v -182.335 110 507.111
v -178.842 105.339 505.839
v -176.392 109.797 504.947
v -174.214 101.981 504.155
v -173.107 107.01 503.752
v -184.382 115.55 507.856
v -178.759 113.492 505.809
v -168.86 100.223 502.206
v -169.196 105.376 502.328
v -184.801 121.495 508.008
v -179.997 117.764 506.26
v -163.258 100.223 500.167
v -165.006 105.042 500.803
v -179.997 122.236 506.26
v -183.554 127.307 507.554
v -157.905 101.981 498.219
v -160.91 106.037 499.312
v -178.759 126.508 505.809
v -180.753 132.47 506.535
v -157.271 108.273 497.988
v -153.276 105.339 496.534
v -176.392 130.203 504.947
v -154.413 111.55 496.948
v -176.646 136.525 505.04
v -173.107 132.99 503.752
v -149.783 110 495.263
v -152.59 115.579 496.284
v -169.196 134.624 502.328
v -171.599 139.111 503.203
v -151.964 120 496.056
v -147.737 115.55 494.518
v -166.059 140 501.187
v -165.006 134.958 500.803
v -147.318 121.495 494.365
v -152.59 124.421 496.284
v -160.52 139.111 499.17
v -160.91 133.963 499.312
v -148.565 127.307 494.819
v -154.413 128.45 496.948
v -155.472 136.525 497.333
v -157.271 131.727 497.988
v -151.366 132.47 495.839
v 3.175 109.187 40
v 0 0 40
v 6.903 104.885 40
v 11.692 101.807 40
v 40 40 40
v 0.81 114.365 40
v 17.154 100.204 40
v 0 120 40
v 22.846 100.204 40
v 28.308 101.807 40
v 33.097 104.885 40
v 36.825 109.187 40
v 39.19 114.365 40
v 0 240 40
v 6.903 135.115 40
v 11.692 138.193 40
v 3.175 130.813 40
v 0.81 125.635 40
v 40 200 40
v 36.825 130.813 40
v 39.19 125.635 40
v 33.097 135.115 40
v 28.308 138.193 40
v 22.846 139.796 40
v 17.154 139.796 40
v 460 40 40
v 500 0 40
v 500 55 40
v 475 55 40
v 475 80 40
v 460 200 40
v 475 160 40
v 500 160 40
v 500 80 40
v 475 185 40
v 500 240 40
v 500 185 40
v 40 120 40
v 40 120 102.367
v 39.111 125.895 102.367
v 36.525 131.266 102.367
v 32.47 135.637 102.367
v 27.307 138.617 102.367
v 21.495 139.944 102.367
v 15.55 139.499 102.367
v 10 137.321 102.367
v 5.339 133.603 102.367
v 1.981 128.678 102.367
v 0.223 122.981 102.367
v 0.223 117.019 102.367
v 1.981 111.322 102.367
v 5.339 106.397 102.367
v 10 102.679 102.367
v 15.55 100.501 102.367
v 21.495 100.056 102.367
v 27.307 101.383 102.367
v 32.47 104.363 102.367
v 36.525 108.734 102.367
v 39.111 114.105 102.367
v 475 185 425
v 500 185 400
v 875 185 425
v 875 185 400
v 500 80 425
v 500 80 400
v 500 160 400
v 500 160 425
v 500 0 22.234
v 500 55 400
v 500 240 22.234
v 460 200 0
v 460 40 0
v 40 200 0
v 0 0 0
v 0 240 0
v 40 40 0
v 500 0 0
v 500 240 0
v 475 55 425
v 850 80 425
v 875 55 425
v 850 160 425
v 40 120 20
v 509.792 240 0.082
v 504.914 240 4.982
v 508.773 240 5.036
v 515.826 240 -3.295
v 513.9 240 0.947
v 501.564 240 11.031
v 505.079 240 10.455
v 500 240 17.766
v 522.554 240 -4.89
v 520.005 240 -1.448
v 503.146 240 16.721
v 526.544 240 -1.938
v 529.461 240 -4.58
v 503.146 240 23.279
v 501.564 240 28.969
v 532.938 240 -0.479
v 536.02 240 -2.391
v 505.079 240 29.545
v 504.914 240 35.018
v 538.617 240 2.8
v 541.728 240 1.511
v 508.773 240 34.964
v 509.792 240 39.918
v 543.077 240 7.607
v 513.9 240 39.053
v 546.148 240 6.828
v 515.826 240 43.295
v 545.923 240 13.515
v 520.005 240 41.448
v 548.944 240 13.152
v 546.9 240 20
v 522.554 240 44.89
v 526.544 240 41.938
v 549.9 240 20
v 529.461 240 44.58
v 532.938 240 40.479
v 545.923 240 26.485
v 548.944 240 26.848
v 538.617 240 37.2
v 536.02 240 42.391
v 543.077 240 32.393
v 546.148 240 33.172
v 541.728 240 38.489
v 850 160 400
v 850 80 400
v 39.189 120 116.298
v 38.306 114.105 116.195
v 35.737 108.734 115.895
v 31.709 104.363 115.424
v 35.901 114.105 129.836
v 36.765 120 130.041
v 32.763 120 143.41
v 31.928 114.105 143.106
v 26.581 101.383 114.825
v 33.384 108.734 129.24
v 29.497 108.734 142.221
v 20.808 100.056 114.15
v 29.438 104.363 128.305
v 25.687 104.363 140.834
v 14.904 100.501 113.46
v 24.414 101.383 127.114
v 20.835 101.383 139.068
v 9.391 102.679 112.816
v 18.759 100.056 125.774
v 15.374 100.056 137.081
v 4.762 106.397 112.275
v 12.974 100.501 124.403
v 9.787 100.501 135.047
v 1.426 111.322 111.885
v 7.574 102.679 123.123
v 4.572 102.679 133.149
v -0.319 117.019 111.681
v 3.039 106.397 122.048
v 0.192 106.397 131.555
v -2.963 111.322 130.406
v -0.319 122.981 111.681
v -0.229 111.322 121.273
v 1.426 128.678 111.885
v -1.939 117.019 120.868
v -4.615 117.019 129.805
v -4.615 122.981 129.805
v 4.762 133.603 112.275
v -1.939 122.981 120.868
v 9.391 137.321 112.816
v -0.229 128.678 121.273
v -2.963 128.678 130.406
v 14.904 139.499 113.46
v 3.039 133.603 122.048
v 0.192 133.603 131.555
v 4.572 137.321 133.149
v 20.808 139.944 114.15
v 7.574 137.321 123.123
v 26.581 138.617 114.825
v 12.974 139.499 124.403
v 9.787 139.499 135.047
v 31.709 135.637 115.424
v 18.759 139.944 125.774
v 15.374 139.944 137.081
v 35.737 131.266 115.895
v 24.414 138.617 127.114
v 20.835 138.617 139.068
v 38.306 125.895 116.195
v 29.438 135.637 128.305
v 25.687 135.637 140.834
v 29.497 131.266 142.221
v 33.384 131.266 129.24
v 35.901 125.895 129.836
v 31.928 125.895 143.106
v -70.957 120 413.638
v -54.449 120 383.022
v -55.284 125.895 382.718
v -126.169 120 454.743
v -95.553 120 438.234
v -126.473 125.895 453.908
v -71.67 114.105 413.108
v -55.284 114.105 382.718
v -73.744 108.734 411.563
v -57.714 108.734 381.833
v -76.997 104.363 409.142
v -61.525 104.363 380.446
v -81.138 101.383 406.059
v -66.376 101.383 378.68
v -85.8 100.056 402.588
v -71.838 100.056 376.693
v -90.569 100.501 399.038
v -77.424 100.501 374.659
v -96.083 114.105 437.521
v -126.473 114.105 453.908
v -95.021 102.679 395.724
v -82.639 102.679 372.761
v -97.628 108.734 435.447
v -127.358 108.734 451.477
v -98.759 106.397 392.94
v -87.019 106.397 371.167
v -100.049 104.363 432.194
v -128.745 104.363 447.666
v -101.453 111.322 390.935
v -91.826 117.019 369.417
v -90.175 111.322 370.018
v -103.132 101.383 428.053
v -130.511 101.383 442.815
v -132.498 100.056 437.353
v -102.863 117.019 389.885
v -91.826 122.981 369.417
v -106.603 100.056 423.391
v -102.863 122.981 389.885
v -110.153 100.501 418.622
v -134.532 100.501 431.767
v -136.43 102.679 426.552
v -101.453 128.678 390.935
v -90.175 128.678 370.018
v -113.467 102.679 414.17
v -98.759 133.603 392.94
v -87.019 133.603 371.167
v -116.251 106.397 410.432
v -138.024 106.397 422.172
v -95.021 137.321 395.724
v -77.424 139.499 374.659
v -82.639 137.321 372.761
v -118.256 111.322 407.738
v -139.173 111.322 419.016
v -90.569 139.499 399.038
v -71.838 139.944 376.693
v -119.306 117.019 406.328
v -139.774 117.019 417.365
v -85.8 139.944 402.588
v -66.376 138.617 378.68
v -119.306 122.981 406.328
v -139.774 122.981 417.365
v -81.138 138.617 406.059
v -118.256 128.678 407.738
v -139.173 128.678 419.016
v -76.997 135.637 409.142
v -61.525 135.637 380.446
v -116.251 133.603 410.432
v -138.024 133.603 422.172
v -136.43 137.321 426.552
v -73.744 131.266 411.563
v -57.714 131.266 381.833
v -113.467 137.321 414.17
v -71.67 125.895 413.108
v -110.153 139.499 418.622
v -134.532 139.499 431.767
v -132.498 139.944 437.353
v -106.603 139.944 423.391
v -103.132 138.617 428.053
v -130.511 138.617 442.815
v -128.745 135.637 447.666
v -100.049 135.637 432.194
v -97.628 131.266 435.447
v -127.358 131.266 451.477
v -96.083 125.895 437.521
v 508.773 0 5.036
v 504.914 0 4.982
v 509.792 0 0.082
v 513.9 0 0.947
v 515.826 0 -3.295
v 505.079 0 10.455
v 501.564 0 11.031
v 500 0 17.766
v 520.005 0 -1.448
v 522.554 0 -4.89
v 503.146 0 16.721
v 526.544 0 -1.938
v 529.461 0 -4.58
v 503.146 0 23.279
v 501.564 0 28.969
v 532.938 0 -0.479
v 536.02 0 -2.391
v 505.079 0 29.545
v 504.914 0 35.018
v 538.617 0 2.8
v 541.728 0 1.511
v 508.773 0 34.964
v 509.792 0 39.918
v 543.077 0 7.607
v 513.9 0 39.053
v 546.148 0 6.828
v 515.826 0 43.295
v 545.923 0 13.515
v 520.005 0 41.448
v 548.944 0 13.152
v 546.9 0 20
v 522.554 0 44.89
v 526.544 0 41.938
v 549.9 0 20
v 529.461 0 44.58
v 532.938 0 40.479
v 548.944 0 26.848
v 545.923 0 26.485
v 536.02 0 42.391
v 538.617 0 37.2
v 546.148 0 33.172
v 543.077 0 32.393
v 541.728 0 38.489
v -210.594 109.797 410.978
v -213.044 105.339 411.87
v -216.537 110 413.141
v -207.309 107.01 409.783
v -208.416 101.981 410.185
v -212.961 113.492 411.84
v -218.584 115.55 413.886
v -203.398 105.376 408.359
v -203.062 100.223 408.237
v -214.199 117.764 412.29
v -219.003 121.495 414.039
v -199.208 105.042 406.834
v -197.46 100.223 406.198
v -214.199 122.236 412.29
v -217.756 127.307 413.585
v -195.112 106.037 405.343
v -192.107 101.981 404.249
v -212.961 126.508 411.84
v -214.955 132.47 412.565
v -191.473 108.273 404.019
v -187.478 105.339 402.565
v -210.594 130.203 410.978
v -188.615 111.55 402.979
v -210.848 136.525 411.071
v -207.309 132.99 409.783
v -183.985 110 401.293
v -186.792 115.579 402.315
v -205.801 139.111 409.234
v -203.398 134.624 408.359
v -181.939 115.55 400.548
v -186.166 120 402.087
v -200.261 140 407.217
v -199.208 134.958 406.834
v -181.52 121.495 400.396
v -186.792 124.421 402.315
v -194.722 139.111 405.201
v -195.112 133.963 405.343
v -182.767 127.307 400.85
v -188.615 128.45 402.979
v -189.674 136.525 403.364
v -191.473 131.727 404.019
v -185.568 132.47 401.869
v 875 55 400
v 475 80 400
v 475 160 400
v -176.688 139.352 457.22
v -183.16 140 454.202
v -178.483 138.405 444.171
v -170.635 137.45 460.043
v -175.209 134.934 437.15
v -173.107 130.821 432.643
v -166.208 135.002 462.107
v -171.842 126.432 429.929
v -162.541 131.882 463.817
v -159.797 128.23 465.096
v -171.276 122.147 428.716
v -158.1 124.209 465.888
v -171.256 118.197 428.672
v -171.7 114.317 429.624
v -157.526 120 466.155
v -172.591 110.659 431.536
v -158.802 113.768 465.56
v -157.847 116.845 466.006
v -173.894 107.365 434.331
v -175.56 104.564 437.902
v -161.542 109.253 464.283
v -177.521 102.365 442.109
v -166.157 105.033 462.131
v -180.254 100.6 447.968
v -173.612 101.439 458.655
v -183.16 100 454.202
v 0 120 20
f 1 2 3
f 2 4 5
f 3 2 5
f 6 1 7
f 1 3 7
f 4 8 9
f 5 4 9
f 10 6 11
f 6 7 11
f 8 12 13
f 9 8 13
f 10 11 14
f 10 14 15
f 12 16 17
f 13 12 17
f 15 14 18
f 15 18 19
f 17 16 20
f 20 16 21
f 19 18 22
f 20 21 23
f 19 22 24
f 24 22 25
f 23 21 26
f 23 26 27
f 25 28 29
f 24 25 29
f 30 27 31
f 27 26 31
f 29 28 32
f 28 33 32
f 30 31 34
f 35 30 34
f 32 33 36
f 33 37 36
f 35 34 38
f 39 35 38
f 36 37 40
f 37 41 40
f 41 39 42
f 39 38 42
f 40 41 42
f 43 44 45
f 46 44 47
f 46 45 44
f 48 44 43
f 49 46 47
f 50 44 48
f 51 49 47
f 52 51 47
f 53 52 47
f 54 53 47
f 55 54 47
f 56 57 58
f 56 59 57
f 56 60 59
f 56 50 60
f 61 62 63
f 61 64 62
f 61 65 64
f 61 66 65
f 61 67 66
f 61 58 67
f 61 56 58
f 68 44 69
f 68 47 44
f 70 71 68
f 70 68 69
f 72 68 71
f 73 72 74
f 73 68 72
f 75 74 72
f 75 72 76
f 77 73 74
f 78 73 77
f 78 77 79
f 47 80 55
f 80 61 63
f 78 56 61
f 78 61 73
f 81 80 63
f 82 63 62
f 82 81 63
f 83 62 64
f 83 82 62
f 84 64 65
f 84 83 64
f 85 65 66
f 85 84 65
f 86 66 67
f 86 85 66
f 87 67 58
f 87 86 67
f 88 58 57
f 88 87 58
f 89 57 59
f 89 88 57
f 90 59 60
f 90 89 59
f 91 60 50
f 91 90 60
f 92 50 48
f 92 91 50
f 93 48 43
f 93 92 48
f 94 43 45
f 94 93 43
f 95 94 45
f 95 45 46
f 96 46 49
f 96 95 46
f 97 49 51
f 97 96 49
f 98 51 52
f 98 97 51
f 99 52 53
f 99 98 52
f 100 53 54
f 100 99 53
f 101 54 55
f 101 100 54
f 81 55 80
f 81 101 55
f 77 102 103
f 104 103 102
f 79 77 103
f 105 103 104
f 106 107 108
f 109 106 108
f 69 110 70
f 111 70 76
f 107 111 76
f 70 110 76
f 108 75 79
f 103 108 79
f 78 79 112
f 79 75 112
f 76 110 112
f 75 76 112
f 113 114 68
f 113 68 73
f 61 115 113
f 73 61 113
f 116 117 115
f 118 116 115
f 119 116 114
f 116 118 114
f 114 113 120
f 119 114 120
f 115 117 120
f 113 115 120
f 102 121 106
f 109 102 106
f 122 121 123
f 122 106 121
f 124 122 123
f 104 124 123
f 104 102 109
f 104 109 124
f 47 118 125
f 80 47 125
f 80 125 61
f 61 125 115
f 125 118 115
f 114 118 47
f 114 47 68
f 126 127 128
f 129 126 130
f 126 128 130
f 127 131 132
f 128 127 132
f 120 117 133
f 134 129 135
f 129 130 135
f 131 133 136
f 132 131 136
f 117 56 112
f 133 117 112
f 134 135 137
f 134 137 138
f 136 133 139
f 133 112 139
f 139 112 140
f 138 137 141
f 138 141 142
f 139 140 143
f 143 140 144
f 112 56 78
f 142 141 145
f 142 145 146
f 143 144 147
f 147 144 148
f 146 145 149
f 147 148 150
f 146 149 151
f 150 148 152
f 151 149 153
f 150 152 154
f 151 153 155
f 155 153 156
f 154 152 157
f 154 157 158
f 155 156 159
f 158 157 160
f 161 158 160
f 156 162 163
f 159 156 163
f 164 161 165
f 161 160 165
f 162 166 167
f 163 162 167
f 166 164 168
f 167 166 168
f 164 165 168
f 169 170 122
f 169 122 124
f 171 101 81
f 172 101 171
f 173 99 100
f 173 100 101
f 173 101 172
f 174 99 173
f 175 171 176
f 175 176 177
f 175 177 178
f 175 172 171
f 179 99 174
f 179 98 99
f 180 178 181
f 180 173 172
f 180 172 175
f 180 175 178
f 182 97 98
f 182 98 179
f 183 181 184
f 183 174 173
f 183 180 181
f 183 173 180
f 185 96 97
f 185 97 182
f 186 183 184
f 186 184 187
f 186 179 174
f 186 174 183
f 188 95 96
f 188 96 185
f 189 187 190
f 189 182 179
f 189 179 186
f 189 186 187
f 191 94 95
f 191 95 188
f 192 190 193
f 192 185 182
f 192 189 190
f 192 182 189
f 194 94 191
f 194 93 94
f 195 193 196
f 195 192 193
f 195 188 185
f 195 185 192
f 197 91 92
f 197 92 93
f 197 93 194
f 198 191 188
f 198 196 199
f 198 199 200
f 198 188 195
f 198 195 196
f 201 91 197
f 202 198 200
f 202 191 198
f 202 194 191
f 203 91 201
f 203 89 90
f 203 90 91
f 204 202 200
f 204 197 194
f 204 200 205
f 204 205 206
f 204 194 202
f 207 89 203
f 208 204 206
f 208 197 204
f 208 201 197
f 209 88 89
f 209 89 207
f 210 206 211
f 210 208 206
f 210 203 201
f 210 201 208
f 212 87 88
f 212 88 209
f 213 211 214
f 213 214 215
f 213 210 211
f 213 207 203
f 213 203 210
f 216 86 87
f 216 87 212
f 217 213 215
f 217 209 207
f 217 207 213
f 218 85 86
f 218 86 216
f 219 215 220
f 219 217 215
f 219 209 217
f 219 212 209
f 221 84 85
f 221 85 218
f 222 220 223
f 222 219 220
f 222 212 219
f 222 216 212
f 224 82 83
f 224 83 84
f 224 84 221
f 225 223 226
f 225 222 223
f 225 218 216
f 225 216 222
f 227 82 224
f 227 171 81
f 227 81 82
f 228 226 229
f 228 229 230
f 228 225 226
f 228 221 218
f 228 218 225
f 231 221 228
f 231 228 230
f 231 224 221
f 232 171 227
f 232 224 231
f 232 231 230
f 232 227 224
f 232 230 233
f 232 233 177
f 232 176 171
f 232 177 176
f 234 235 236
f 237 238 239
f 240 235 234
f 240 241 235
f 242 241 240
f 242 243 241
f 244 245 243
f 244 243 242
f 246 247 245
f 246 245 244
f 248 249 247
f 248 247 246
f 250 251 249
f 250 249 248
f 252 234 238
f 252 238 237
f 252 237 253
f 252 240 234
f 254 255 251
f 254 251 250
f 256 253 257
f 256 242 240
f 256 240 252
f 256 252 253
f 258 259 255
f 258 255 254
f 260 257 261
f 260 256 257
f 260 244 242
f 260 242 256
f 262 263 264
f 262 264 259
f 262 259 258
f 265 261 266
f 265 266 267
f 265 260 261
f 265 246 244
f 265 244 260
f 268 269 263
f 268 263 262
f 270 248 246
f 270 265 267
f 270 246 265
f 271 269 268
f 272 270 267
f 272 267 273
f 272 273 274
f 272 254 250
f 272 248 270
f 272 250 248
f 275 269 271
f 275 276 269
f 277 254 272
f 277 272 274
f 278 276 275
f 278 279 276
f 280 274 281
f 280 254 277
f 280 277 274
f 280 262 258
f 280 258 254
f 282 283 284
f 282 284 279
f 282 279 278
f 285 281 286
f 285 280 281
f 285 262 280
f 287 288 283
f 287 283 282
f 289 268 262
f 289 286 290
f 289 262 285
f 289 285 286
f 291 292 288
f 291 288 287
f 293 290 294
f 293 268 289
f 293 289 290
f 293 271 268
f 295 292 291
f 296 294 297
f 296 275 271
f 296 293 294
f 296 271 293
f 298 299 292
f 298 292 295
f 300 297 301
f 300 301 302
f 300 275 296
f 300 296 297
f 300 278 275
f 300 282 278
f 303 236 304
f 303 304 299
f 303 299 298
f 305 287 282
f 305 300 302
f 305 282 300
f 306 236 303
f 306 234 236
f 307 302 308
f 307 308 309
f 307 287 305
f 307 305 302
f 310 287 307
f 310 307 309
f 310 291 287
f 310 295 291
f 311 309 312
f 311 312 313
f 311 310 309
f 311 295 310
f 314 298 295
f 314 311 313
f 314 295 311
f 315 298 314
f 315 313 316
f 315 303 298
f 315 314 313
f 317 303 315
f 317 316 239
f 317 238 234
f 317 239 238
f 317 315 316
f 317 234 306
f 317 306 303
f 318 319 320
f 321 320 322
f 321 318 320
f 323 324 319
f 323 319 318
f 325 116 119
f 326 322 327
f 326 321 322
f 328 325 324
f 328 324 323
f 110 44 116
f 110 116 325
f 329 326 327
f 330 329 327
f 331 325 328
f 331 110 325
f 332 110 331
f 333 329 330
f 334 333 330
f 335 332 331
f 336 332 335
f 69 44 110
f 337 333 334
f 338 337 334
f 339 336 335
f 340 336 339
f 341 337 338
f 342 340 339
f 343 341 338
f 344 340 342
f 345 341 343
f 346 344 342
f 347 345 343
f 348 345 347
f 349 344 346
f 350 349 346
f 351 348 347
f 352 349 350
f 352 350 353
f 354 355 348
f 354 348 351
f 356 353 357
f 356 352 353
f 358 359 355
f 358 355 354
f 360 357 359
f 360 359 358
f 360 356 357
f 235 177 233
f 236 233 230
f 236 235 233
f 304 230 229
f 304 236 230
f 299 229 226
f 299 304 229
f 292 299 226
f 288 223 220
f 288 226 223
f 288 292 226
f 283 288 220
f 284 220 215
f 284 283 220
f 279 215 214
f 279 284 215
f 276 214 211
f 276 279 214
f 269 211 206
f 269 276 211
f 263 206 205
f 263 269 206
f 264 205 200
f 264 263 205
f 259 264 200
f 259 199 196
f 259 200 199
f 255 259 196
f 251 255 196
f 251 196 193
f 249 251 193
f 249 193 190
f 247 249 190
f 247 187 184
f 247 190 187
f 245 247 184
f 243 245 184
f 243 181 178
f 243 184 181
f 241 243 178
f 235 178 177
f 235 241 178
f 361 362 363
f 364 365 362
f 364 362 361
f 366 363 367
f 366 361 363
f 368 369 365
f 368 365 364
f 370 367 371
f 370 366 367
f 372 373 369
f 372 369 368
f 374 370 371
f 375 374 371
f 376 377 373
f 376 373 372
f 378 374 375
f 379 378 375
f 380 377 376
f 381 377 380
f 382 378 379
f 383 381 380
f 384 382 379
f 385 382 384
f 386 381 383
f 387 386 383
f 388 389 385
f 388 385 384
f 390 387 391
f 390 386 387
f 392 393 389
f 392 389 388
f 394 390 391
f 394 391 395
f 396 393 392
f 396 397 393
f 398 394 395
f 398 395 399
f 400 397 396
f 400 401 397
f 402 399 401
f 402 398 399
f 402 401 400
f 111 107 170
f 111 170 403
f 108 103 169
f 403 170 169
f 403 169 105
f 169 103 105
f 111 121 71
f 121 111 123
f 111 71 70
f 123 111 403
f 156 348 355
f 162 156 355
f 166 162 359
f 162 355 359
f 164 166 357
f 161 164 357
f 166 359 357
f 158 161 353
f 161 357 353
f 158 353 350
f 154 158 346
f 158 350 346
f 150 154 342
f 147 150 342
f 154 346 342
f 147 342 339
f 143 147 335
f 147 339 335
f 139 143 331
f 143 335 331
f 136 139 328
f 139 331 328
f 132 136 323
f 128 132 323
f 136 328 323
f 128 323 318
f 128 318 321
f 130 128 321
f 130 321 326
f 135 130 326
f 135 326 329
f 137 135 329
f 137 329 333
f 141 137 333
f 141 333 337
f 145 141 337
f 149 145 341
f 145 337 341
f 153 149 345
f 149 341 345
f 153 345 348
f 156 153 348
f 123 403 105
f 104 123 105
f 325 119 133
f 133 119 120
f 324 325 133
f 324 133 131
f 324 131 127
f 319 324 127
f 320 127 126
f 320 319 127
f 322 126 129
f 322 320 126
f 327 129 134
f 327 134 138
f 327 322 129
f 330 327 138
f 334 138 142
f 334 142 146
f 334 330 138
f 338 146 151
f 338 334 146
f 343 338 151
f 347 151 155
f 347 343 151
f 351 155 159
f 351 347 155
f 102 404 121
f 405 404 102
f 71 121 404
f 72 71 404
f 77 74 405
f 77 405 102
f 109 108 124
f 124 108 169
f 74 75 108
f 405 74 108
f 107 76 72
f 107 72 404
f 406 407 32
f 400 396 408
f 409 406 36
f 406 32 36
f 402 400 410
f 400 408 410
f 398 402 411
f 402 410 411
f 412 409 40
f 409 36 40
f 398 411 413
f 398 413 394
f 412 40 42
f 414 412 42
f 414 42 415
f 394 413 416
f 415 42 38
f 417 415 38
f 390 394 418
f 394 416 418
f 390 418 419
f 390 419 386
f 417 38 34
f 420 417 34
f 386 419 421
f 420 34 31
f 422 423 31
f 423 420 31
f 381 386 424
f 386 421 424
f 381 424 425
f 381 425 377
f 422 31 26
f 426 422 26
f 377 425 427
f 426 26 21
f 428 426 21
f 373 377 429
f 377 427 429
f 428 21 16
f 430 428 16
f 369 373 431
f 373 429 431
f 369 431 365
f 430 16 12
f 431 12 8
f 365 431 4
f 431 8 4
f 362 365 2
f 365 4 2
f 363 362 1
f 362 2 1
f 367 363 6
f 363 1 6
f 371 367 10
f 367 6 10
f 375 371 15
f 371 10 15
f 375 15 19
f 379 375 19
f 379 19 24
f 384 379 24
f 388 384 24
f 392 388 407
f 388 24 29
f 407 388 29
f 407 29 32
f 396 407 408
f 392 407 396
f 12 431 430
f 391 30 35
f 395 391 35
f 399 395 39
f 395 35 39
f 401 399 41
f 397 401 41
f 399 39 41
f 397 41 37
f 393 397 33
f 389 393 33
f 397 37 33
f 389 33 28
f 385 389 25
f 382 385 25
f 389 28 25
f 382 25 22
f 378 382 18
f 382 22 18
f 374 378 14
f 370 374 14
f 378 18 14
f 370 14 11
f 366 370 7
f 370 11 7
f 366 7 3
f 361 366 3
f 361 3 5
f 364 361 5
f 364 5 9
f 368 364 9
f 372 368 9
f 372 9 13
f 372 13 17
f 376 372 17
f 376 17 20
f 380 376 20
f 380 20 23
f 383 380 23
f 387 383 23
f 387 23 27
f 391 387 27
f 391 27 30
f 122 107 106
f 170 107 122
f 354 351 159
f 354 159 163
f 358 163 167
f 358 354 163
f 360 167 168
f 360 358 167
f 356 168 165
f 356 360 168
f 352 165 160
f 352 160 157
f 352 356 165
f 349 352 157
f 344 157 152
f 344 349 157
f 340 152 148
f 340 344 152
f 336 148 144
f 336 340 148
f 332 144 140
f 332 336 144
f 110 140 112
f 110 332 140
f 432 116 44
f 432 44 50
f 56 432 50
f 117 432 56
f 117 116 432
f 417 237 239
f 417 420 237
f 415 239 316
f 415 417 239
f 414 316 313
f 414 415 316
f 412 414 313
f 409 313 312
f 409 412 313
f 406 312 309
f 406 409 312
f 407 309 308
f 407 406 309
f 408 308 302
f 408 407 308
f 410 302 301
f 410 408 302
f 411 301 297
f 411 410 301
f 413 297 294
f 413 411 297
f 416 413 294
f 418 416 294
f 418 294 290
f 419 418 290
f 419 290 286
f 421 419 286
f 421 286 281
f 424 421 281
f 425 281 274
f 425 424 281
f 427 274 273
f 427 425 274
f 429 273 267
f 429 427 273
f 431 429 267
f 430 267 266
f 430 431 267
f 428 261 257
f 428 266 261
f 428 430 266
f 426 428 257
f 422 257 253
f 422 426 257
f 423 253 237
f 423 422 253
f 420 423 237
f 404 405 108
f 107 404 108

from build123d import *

# Parameters (mm, degrees)
F0_W      = 500
F0_H      = 240
F0_W_2    = 420
F0_H_2    = 160
F1_DEPTH  = 40
F2_W      = 25
F2_H      = 360
F3_DEPTH  = 25
F4_W      = 400
F4_H      = 130
F4_W_2    = 350
F4_H_2    = 80
F5_DEPTH  = 25
F6_R      = 25
F6_R_2    = 22
F7_DEPTH  = 240
F11_R     = 20
F13_W     = 20
F13_H     = 100
F15_R     = 15
F16_DEPTH = 493.7865093372


with BuildPart() as f1:
    # F0 (on Top) → F1 (new body)
    with BuildSketch(Plane.XY):
        with Locations((250, 120)):
            Rectangle(F0_W, F0_H)
        with Locations((250, 120)):
            Rectangle(F0_W_2, F0_H_2, mode=Mode.SUBTRACT)
    extrude(amount=F1_DEPTH)

    # F2 (on face) → F3 (join)
    with BuildSketch(Plane.YZ.offset(500)):
        with Locations((67.5, 220)):
            Rectangle(F2_W, F2_H)
        with Locations((172.5, 220)):
            Rectangle(F2_W, F2_H)
    extrude(amount=-F3_DEPTH)

    # F4 (on face) → F5 (join)
    with BuildSketch(Plane.XY.offset(400)):
        with Locations((675, 120)):
            Rectangle(F4_W, F4_H)
        with Locations((675, 120)):
            Rectangle(F4_W_2, F4_H_2, mode=Mode.SUBTRACT)
    extrude(amount=F5_DEPTH)

    # F6 (on Front) → F7 (join)
    with BuildSketch(Plane.XZ):
        with Locations((524.9, 20)):
            Circle(F6_R)
        with Locations((524.9, 20)):
            Circle(F6_R_2, mode=Mode.SUBTRACT)
    extrude(amount=-F7_DEPTH)

    # F12: sweep along a path in F9
    with BuildLine(Plane.XZ.offset(-120)) as f12_path:
        Line((20, 20), (20, 102.3673019292))
        ThreePointArc((20, 102.3673019292), (18.4807753012, 119.7321196958), (13.9692620786, 136.5693162617))
        Line((13.9692620786, 136.5693162617), (-73.2424090723, 376.1814134616))
        ThreePointArc((-73.2424090723, 376.1814134616), (-96.5009930322, 412.6900772477), (-133.0096568183, 435.9486612076))
        Line((-133.0096568183, 435.9486612076), (-183.1603323585, 454.2020143326))
    # F11 (on line) → F12 (sweep)
    with BuildSketch(Plane.XY.offset(20)):
        with Locations((20, 120)):
            Circle(F11_R)
    sweep(path=f12_path.line)

    # F13 (on face) → F14 (revolve)
    with BuildSketch(Plane(origin=(-307.7123571346, 0, 111.9981387129), x_dir=(0, -1, 0), z_dir=(-0.9396926208, 0, 0.3420201433))):
        with Locations((-130, 364.1657580896)):
            Rectangle(F13_W, F13_H)
    revolve(axis=Axis((-183.1603323585, 120, 454.2020143326), (-0.3420201433, 0, -0.9396926208)))

    # F15 (on face) → F16 (cut, through all)
    with BuildSketch(Plane(origin=(141.6530319424, 0, 389.188506659), x_dir=(0.9396926208, 0, -0.3420201433), z_dir=(0.3420201433, 0, 0.9396926208))):
        with Locations((-327.4606507788, 120)):
            Circle(F15_R)
    extrude(amount=-F16_DEPTH, mode=Mode.SUBTRACT)


solid = f1.part
